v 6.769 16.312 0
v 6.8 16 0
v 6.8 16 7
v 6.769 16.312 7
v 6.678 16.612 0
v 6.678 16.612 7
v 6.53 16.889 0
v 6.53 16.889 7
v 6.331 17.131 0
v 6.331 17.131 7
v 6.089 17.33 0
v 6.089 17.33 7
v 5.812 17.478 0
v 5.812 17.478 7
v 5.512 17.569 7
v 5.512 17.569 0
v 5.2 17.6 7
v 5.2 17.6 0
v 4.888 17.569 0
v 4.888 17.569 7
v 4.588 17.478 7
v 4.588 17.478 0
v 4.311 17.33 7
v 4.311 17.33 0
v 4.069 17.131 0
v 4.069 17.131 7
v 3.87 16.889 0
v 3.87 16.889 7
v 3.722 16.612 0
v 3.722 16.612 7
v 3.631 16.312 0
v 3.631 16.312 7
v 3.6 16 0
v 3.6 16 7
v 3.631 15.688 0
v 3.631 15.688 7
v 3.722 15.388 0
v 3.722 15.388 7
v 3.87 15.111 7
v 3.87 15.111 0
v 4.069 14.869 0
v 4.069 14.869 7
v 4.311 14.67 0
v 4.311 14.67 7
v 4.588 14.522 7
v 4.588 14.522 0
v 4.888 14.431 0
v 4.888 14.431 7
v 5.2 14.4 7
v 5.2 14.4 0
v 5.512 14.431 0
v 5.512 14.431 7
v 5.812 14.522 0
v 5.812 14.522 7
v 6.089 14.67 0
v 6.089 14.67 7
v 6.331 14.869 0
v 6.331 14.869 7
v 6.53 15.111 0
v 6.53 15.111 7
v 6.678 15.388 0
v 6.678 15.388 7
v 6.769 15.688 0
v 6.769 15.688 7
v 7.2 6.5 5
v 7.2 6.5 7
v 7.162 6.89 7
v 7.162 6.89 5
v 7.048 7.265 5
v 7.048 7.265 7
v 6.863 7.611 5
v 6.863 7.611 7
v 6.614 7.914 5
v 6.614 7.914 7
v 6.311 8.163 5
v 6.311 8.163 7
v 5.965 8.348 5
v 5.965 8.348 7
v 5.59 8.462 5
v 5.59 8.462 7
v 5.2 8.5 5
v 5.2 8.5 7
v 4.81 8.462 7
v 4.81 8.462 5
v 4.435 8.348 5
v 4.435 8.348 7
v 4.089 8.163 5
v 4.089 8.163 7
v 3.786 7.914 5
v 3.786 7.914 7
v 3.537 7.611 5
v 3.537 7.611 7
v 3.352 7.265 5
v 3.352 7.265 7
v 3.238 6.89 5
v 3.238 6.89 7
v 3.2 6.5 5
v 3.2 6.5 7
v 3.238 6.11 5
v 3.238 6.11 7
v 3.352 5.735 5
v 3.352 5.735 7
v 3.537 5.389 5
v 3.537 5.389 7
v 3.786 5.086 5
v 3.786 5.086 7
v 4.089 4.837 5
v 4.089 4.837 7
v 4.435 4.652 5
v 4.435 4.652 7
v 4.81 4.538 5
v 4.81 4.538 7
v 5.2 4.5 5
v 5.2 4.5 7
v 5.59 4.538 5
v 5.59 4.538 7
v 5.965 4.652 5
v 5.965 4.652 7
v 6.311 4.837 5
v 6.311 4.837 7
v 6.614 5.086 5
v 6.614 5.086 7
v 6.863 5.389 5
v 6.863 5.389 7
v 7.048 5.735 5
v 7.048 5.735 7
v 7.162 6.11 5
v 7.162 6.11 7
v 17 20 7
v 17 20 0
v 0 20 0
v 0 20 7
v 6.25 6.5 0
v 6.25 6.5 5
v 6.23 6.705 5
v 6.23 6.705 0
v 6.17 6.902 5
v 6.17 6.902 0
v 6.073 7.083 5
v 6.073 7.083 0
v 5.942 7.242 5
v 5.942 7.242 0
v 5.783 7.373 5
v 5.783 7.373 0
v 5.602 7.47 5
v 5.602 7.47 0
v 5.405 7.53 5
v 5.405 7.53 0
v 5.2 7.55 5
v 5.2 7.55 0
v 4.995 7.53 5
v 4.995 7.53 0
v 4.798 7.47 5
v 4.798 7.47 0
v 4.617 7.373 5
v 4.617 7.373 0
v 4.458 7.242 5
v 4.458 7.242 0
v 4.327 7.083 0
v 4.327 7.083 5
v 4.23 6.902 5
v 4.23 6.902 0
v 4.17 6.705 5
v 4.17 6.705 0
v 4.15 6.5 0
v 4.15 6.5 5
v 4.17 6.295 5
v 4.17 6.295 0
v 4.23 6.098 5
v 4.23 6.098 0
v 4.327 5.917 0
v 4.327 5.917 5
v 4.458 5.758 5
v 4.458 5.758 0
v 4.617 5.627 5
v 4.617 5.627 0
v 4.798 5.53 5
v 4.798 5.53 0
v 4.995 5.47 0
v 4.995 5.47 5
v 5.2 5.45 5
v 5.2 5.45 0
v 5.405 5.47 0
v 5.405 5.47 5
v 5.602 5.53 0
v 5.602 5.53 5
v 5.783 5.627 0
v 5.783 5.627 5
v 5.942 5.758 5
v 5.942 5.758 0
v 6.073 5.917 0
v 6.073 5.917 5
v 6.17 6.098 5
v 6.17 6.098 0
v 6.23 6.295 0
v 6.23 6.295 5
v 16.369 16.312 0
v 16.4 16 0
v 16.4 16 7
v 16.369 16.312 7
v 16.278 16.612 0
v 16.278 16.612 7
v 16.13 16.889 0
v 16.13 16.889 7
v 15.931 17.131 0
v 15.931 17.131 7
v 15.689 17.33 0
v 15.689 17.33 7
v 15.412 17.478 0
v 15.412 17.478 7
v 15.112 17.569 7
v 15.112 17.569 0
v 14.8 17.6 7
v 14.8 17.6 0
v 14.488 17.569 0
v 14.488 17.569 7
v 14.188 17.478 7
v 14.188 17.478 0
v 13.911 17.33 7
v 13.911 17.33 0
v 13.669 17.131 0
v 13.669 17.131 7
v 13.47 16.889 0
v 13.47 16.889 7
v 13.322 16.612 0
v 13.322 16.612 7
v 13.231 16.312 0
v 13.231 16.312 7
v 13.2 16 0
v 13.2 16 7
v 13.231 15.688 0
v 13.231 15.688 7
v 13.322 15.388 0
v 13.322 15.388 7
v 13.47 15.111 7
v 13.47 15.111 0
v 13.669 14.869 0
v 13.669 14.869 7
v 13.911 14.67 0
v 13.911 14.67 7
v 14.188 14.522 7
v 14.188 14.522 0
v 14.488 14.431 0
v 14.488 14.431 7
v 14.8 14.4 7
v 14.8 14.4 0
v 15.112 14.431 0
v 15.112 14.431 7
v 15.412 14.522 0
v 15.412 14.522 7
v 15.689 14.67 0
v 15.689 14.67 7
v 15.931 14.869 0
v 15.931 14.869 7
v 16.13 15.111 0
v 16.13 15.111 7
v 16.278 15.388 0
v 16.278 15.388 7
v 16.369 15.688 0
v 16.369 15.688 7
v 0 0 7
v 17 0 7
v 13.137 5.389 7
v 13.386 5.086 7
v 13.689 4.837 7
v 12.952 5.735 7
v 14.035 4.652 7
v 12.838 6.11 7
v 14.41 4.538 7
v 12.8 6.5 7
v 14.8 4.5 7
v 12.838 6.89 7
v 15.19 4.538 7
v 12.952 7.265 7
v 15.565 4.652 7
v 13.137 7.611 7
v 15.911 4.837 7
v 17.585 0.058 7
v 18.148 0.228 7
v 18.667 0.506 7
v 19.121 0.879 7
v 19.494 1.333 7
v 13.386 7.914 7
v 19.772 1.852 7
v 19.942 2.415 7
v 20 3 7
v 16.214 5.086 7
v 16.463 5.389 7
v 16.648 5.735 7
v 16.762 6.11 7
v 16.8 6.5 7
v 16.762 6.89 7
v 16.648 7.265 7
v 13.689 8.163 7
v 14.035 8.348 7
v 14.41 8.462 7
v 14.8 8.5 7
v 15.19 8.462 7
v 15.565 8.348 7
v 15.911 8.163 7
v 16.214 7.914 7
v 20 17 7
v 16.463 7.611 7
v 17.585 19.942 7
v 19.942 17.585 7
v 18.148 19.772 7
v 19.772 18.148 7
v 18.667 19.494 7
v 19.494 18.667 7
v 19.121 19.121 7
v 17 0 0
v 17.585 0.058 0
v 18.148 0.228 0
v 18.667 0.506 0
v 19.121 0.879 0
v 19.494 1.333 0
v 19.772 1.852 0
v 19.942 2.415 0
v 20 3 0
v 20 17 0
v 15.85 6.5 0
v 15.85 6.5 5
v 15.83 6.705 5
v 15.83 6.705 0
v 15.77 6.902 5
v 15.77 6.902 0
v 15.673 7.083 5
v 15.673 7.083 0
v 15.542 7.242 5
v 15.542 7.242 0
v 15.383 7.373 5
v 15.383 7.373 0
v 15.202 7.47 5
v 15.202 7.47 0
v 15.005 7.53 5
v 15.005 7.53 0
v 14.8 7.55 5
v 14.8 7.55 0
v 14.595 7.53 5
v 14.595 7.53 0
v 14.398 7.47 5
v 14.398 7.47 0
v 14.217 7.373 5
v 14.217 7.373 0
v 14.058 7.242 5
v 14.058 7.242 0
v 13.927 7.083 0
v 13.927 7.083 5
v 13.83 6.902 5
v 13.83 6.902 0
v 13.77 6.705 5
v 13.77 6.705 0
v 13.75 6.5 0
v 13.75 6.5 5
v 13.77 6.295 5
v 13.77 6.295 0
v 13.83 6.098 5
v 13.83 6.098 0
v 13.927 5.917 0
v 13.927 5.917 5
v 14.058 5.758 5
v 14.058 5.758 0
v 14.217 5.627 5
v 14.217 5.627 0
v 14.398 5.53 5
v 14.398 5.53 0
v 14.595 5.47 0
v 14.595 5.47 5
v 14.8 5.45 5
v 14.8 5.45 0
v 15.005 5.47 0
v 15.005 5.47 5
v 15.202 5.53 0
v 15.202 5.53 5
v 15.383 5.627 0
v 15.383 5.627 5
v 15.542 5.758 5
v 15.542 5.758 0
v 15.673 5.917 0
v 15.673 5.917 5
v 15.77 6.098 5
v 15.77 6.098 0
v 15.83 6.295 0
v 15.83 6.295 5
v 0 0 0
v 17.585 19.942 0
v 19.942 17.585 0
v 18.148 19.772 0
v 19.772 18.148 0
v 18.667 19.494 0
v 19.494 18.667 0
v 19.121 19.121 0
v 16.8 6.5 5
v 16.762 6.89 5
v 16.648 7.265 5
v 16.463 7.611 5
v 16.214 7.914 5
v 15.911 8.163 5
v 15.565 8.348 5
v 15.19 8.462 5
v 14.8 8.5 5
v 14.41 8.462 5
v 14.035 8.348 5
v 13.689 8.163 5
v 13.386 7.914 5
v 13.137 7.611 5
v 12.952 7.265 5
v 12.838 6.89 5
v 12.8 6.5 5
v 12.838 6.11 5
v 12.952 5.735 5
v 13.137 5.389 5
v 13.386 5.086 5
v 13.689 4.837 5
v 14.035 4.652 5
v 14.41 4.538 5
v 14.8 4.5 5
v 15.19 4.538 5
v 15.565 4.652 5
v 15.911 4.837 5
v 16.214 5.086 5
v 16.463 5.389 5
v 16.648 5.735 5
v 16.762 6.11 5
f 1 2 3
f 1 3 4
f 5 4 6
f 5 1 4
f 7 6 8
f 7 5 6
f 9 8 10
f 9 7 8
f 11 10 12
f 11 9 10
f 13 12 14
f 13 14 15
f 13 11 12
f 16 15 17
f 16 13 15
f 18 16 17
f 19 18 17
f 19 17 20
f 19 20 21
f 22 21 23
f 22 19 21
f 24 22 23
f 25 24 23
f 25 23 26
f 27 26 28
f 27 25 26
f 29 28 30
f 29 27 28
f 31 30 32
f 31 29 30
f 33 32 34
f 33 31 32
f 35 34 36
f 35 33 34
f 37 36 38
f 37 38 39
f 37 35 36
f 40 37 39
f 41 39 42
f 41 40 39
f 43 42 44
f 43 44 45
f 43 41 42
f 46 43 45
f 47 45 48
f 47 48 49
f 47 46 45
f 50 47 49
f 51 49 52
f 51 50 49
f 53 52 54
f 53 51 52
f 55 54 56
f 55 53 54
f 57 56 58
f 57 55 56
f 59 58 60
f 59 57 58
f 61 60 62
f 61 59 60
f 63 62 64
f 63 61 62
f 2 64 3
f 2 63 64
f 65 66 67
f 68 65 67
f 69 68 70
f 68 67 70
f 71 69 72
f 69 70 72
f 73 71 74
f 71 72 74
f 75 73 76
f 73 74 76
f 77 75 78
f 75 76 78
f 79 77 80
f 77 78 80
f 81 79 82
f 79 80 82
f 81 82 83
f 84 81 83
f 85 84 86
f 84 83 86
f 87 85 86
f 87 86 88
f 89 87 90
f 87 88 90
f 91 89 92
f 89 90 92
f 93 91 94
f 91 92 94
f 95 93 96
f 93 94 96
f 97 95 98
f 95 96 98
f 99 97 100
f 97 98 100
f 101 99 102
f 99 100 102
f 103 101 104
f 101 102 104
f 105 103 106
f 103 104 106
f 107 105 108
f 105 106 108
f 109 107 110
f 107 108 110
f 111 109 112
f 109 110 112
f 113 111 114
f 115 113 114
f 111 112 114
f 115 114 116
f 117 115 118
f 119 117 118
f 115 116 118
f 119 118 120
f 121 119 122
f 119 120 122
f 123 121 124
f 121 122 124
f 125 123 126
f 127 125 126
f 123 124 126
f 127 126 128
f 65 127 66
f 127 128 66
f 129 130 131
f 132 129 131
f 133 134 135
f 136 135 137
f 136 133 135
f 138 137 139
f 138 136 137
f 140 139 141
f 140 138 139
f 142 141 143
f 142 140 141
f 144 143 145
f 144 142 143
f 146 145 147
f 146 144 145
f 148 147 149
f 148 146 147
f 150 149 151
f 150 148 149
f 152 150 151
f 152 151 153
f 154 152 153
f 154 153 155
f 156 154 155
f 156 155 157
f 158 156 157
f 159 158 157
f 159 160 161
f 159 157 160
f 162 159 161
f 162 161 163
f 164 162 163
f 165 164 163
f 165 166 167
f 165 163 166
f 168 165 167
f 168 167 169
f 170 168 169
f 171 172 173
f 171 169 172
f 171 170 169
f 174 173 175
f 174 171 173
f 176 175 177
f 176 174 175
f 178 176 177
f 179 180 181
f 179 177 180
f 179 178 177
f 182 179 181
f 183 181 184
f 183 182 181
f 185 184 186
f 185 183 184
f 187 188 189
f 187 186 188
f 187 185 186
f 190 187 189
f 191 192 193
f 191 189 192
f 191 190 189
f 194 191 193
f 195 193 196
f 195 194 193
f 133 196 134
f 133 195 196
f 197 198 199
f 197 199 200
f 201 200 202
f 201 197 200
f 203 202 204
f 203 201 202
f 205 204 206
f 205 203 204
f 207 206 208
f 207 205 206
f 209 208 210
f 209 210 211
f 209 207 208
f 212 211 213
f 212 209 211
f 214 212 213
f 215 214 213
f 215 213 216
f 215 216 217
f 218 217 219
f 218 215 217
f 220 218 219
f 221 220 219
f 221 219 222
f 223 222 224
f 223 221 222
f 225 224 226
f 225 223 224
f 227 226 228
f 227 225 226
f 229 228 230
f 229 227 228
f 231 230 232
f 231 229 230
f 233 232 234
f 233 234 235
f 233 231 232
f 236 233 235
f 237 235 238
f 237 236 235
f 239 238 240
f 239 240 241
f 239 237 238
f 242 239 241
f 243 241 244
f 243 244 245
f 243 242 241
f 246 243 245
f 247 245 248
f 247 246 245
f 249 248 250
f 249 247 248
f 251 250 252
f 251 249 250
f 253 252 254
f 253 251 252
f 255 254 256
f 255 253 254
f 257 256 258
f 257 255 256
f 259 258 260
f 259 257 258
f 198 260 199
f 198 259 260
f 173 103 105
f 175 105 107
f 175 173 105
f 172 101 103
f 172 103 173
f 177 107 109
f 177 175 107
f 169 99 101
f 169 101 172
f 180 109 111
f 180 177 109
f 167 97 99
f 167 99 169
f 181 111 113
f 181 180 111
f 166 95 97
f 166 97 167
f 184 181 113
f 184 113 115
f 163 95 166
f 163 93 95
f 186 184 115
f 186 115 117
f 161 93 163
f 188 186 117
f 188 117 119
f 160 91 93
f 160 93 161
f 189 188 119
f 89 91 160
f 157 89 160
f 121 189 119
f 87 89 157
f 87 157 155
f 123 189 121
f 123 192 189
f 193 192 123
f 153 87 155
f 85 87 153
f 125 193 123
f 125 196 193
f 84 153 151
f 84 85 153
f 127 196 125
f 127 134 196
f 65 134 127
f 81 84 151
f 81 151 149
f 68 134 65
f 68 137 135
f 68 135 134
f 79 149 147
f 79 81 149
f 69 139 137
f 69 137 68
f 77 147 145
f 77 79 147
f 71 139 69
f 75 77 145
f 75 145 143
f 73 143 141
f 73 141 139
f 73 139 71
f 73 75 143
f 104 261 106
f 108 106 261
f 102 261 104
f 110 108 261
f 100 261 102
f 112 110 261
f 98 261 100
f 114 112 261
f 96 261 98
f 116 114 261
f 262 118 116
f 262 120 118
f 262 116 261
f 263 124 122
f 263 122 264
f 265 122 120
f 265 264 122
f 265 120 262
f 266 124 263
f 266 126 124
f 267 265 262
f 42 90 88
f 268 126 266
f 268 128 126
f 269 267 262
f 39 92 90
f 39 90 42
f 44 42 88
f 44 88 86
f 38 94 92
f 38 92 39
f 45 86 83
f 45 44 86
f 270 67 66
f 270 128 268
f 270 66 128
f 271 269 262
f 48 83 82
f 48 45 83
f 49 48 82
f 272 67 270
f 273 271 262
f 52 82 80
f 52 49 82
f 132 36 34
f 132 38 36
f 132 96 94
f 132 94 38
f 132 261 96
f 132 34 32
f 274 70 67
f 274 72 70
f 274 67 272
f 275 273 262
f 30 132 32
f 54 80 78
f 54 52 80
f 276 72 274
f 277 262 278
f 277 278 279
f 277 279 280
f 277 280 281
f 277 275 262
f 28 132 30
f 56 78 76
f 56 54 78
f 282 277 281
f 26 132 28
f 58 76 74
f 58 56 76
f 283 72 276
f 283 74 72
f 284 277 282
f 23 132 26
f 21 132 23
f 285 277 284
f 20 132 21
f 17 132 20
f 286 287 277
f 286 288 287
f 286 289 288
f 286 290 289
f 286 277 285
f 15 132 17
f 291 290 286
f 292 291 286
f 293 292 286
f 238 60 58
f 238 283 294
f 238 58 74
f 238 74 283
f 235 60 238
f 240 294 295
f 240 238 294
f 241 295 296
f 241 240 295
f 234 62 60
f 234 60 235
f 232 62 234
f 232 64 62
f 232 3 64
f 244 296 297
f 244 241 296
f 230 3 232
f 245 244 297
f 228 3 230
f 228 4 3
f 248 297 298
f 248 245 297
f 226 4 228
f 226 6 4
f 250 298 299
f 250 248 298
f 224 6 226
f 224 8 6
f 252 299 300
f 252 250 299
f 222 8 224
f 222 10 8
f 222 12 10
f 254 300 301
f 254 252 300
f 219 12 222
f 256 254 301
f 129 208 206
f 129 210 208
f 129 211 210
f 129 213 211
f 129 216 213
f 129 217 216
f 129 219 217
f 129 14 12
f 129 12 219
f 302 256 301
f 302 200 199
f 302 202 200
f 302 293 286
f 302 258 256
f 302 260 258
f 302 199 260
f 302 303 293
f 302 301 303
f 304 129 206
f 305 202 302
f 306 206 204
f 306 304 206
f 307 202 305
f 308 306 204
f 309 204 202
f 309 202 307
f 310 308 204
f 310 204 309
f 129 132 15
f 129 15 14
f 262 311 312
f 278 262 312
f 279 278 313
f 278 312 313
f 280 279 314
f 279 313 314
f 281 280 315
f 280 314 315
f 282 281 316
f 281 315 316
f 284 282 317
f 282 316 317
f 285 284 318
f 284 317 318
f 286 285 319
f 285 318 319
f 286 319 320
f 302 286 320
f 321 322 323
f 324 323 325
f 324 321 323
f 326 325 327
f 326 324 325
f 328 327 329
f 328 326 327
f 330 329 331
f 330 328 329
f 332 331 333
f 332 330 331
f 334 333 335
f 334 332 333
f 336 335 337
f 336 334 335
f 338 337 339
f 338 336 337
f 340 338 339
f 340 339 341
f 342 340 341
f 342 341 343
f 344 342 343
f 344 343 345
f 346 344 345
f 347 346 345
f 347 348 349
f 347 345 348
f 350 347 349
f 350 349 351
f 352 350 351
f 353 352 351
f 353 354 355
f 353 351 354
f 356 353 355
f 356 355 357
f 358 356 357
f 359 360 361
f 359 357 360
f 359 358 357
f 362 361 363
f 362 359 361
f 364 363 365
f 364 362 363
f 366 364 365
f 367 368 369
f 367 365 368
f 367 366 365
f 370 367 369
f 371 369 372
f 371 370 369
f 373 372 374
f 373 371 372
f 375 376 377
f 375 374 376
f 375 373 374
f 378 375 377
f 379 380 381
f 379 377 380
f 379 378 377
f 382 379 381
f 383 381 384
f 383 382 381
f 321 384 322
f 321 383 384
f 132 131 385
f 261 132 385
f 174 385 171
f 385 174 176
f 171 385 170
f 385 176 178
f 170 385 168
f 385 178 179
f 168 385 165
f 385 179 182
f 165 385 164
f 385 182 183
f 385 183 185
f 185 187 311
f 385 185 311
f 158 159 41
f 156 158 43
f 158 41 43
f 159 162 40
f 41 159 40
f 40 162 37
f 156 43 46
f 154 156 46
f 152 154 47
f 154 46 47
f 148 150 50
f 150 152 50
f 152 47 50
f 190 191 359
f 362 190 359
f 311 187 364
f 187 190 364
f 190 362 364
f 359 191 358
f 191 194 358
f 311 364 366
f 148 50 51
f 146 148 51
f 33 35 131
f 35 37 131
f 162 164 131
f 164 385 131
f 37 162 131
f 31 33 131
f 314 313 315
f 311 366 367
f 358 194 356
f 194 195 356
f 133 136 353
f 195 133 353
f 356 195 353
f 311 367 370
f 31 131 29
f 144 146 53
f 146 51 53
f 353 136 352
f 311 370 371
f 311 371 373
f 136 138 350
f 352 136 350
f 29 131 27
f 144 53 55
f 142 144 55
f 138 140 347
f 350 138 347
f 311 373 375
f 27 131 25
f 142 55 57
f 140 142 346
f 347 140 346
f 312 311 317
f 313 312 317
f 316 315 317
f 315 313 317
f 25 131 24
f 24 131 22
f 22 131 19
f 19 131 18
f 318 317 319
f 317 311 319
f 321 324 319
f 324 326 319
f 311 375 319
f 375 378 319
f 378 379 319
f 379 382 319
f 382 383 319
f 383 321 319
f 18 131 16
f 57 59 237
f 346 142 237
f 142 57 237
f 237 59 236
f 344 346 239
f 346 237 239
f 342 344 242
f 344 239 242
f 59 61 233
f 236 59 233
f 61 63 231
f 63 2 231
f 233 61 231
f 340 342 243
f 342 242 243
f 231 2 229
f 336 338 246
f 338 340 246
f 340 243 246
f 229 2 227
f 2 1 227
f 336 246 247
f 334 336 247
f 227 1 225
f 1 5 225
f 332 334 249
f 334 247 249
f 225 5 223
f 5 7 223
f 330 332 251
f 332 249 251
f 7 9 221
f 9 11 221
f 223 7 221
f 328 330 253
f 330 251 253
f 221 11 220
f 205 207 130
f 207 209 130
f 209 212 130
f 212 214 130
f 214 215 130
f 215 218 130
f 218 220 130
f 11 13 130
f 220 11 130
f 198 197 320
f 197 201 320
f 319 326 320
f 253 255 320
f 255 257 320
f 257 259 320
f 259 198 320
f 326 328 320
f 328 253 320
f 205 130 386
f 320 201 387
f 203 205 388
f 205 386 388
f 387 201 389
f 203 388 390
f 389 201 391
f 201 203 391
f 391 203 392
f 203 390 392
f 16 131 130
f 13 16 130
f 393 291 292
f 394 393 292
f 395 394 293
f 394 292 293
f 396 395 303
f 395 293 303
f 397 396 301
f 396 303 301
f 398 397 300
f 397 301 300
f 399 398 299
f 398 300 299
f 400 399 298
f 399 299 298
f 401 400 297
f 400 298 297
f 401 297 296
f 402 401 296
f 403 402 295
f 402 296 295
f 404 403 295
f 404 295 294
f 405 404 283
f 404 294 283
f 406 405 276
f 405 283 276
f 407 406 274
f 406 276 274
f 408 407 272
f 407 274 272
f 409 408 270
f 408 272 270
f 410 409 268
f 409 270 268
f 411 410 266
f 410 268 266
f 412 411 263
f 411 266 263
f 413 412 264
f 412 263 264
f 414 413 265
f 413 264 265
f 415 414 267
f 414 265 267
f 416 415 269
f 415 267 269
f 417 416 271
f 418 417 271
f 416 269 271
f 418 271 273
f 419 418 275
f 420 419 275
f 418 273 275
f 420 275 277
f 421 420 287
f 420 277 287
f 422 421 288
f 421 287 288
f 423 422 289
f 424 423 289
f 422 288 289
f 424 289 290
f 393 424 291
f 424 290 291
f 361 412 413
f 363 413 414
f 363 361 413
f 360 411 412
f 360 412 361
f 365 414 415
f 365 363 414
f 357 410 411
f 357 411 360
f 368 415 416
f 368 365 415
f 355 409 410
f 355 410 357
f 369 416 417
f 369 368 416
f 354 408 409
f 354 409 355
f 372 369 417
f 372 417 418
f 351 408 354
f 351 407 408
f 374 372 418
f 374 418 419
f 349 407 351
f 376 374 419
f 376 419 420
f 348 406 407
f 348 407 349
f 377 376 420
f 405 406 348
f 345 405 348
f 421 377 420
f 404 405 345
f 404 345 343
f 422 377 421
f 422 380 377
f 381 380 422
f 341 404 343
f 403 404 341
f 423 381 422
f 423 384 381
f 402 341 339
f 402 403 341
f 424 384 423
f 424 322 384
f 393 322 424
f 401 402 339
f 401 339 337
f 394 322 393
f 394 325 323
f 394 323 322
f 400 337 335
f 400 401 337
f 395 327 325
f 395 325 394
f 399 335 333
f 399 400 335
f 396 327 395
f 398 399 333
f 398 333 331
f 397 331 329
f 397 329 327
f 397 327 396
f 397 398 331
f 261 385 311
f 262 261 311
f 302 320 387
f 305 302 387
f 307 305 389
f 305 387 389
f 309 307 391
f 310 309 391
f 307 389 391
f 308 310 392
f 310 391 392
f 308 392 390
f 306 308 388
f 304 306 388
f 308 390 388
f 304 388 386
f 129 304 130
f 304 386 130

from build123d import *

# Parameters (mm, degrees)
SKETCH1_R           = 1.6
SKETCH1_R_2         = 1.05
BOSS_EXTRUDE1_DEPTH = 7
SKETCH2_R           = 2
CUT_EXTRUDE1_DEPTH  = 2


with BuildPart() as part:
    # Sketch1 → Boss-Extrude1 (new body)
    with BuildSketch(Plane.XY):
        with BuildLine():
            Line((0, 0), (17, 0))
            ThreePointArc((17, 0), (19.121320344, 0.878679656), (20, 3))
            Line((20, 3), (20, 17))
            ThreePointArc((20, 17), (19.121320344, 19.121320344), (17, 20))
            Line((17, 20), (0, 20))
            Line((0, 20), (0, 0))
        make_face()
        with Locations((5.2, 16)):
            Circle(SKETCH1_R, mode=Mode.SUBTRACT)
        with Locations((14.8, 16)):
            Circle(SKETCH1_R, mode=Mode.SUBTRACT)
        with Locations((5.2, 6.5)):
            Circle(SKETCH1_R_2, mode=Mode.SUBTRACT)
        with Locations((14.8, 6.5)):
            Circle(SKETCH1_R_2, mode=Mode.SUBTRACT)
    extrude(amount=BOSS_EXTRUDE1_DEPTH)

    # Sketch2 → Cut-Extrude1 (cut)
    with BuildSketch(Plane.XY.offset(7)):
        with Locations((5.2, 6.5)):
            Circle(SKETCH2_R)
        with Locations((14.8, 6.5)):
            Circle(SKETCH2_R)
    extrude(amount=-CUT_EXTRUDE1_DEPTH, mode=Mode.SUBTRACT)


solid = part.part
